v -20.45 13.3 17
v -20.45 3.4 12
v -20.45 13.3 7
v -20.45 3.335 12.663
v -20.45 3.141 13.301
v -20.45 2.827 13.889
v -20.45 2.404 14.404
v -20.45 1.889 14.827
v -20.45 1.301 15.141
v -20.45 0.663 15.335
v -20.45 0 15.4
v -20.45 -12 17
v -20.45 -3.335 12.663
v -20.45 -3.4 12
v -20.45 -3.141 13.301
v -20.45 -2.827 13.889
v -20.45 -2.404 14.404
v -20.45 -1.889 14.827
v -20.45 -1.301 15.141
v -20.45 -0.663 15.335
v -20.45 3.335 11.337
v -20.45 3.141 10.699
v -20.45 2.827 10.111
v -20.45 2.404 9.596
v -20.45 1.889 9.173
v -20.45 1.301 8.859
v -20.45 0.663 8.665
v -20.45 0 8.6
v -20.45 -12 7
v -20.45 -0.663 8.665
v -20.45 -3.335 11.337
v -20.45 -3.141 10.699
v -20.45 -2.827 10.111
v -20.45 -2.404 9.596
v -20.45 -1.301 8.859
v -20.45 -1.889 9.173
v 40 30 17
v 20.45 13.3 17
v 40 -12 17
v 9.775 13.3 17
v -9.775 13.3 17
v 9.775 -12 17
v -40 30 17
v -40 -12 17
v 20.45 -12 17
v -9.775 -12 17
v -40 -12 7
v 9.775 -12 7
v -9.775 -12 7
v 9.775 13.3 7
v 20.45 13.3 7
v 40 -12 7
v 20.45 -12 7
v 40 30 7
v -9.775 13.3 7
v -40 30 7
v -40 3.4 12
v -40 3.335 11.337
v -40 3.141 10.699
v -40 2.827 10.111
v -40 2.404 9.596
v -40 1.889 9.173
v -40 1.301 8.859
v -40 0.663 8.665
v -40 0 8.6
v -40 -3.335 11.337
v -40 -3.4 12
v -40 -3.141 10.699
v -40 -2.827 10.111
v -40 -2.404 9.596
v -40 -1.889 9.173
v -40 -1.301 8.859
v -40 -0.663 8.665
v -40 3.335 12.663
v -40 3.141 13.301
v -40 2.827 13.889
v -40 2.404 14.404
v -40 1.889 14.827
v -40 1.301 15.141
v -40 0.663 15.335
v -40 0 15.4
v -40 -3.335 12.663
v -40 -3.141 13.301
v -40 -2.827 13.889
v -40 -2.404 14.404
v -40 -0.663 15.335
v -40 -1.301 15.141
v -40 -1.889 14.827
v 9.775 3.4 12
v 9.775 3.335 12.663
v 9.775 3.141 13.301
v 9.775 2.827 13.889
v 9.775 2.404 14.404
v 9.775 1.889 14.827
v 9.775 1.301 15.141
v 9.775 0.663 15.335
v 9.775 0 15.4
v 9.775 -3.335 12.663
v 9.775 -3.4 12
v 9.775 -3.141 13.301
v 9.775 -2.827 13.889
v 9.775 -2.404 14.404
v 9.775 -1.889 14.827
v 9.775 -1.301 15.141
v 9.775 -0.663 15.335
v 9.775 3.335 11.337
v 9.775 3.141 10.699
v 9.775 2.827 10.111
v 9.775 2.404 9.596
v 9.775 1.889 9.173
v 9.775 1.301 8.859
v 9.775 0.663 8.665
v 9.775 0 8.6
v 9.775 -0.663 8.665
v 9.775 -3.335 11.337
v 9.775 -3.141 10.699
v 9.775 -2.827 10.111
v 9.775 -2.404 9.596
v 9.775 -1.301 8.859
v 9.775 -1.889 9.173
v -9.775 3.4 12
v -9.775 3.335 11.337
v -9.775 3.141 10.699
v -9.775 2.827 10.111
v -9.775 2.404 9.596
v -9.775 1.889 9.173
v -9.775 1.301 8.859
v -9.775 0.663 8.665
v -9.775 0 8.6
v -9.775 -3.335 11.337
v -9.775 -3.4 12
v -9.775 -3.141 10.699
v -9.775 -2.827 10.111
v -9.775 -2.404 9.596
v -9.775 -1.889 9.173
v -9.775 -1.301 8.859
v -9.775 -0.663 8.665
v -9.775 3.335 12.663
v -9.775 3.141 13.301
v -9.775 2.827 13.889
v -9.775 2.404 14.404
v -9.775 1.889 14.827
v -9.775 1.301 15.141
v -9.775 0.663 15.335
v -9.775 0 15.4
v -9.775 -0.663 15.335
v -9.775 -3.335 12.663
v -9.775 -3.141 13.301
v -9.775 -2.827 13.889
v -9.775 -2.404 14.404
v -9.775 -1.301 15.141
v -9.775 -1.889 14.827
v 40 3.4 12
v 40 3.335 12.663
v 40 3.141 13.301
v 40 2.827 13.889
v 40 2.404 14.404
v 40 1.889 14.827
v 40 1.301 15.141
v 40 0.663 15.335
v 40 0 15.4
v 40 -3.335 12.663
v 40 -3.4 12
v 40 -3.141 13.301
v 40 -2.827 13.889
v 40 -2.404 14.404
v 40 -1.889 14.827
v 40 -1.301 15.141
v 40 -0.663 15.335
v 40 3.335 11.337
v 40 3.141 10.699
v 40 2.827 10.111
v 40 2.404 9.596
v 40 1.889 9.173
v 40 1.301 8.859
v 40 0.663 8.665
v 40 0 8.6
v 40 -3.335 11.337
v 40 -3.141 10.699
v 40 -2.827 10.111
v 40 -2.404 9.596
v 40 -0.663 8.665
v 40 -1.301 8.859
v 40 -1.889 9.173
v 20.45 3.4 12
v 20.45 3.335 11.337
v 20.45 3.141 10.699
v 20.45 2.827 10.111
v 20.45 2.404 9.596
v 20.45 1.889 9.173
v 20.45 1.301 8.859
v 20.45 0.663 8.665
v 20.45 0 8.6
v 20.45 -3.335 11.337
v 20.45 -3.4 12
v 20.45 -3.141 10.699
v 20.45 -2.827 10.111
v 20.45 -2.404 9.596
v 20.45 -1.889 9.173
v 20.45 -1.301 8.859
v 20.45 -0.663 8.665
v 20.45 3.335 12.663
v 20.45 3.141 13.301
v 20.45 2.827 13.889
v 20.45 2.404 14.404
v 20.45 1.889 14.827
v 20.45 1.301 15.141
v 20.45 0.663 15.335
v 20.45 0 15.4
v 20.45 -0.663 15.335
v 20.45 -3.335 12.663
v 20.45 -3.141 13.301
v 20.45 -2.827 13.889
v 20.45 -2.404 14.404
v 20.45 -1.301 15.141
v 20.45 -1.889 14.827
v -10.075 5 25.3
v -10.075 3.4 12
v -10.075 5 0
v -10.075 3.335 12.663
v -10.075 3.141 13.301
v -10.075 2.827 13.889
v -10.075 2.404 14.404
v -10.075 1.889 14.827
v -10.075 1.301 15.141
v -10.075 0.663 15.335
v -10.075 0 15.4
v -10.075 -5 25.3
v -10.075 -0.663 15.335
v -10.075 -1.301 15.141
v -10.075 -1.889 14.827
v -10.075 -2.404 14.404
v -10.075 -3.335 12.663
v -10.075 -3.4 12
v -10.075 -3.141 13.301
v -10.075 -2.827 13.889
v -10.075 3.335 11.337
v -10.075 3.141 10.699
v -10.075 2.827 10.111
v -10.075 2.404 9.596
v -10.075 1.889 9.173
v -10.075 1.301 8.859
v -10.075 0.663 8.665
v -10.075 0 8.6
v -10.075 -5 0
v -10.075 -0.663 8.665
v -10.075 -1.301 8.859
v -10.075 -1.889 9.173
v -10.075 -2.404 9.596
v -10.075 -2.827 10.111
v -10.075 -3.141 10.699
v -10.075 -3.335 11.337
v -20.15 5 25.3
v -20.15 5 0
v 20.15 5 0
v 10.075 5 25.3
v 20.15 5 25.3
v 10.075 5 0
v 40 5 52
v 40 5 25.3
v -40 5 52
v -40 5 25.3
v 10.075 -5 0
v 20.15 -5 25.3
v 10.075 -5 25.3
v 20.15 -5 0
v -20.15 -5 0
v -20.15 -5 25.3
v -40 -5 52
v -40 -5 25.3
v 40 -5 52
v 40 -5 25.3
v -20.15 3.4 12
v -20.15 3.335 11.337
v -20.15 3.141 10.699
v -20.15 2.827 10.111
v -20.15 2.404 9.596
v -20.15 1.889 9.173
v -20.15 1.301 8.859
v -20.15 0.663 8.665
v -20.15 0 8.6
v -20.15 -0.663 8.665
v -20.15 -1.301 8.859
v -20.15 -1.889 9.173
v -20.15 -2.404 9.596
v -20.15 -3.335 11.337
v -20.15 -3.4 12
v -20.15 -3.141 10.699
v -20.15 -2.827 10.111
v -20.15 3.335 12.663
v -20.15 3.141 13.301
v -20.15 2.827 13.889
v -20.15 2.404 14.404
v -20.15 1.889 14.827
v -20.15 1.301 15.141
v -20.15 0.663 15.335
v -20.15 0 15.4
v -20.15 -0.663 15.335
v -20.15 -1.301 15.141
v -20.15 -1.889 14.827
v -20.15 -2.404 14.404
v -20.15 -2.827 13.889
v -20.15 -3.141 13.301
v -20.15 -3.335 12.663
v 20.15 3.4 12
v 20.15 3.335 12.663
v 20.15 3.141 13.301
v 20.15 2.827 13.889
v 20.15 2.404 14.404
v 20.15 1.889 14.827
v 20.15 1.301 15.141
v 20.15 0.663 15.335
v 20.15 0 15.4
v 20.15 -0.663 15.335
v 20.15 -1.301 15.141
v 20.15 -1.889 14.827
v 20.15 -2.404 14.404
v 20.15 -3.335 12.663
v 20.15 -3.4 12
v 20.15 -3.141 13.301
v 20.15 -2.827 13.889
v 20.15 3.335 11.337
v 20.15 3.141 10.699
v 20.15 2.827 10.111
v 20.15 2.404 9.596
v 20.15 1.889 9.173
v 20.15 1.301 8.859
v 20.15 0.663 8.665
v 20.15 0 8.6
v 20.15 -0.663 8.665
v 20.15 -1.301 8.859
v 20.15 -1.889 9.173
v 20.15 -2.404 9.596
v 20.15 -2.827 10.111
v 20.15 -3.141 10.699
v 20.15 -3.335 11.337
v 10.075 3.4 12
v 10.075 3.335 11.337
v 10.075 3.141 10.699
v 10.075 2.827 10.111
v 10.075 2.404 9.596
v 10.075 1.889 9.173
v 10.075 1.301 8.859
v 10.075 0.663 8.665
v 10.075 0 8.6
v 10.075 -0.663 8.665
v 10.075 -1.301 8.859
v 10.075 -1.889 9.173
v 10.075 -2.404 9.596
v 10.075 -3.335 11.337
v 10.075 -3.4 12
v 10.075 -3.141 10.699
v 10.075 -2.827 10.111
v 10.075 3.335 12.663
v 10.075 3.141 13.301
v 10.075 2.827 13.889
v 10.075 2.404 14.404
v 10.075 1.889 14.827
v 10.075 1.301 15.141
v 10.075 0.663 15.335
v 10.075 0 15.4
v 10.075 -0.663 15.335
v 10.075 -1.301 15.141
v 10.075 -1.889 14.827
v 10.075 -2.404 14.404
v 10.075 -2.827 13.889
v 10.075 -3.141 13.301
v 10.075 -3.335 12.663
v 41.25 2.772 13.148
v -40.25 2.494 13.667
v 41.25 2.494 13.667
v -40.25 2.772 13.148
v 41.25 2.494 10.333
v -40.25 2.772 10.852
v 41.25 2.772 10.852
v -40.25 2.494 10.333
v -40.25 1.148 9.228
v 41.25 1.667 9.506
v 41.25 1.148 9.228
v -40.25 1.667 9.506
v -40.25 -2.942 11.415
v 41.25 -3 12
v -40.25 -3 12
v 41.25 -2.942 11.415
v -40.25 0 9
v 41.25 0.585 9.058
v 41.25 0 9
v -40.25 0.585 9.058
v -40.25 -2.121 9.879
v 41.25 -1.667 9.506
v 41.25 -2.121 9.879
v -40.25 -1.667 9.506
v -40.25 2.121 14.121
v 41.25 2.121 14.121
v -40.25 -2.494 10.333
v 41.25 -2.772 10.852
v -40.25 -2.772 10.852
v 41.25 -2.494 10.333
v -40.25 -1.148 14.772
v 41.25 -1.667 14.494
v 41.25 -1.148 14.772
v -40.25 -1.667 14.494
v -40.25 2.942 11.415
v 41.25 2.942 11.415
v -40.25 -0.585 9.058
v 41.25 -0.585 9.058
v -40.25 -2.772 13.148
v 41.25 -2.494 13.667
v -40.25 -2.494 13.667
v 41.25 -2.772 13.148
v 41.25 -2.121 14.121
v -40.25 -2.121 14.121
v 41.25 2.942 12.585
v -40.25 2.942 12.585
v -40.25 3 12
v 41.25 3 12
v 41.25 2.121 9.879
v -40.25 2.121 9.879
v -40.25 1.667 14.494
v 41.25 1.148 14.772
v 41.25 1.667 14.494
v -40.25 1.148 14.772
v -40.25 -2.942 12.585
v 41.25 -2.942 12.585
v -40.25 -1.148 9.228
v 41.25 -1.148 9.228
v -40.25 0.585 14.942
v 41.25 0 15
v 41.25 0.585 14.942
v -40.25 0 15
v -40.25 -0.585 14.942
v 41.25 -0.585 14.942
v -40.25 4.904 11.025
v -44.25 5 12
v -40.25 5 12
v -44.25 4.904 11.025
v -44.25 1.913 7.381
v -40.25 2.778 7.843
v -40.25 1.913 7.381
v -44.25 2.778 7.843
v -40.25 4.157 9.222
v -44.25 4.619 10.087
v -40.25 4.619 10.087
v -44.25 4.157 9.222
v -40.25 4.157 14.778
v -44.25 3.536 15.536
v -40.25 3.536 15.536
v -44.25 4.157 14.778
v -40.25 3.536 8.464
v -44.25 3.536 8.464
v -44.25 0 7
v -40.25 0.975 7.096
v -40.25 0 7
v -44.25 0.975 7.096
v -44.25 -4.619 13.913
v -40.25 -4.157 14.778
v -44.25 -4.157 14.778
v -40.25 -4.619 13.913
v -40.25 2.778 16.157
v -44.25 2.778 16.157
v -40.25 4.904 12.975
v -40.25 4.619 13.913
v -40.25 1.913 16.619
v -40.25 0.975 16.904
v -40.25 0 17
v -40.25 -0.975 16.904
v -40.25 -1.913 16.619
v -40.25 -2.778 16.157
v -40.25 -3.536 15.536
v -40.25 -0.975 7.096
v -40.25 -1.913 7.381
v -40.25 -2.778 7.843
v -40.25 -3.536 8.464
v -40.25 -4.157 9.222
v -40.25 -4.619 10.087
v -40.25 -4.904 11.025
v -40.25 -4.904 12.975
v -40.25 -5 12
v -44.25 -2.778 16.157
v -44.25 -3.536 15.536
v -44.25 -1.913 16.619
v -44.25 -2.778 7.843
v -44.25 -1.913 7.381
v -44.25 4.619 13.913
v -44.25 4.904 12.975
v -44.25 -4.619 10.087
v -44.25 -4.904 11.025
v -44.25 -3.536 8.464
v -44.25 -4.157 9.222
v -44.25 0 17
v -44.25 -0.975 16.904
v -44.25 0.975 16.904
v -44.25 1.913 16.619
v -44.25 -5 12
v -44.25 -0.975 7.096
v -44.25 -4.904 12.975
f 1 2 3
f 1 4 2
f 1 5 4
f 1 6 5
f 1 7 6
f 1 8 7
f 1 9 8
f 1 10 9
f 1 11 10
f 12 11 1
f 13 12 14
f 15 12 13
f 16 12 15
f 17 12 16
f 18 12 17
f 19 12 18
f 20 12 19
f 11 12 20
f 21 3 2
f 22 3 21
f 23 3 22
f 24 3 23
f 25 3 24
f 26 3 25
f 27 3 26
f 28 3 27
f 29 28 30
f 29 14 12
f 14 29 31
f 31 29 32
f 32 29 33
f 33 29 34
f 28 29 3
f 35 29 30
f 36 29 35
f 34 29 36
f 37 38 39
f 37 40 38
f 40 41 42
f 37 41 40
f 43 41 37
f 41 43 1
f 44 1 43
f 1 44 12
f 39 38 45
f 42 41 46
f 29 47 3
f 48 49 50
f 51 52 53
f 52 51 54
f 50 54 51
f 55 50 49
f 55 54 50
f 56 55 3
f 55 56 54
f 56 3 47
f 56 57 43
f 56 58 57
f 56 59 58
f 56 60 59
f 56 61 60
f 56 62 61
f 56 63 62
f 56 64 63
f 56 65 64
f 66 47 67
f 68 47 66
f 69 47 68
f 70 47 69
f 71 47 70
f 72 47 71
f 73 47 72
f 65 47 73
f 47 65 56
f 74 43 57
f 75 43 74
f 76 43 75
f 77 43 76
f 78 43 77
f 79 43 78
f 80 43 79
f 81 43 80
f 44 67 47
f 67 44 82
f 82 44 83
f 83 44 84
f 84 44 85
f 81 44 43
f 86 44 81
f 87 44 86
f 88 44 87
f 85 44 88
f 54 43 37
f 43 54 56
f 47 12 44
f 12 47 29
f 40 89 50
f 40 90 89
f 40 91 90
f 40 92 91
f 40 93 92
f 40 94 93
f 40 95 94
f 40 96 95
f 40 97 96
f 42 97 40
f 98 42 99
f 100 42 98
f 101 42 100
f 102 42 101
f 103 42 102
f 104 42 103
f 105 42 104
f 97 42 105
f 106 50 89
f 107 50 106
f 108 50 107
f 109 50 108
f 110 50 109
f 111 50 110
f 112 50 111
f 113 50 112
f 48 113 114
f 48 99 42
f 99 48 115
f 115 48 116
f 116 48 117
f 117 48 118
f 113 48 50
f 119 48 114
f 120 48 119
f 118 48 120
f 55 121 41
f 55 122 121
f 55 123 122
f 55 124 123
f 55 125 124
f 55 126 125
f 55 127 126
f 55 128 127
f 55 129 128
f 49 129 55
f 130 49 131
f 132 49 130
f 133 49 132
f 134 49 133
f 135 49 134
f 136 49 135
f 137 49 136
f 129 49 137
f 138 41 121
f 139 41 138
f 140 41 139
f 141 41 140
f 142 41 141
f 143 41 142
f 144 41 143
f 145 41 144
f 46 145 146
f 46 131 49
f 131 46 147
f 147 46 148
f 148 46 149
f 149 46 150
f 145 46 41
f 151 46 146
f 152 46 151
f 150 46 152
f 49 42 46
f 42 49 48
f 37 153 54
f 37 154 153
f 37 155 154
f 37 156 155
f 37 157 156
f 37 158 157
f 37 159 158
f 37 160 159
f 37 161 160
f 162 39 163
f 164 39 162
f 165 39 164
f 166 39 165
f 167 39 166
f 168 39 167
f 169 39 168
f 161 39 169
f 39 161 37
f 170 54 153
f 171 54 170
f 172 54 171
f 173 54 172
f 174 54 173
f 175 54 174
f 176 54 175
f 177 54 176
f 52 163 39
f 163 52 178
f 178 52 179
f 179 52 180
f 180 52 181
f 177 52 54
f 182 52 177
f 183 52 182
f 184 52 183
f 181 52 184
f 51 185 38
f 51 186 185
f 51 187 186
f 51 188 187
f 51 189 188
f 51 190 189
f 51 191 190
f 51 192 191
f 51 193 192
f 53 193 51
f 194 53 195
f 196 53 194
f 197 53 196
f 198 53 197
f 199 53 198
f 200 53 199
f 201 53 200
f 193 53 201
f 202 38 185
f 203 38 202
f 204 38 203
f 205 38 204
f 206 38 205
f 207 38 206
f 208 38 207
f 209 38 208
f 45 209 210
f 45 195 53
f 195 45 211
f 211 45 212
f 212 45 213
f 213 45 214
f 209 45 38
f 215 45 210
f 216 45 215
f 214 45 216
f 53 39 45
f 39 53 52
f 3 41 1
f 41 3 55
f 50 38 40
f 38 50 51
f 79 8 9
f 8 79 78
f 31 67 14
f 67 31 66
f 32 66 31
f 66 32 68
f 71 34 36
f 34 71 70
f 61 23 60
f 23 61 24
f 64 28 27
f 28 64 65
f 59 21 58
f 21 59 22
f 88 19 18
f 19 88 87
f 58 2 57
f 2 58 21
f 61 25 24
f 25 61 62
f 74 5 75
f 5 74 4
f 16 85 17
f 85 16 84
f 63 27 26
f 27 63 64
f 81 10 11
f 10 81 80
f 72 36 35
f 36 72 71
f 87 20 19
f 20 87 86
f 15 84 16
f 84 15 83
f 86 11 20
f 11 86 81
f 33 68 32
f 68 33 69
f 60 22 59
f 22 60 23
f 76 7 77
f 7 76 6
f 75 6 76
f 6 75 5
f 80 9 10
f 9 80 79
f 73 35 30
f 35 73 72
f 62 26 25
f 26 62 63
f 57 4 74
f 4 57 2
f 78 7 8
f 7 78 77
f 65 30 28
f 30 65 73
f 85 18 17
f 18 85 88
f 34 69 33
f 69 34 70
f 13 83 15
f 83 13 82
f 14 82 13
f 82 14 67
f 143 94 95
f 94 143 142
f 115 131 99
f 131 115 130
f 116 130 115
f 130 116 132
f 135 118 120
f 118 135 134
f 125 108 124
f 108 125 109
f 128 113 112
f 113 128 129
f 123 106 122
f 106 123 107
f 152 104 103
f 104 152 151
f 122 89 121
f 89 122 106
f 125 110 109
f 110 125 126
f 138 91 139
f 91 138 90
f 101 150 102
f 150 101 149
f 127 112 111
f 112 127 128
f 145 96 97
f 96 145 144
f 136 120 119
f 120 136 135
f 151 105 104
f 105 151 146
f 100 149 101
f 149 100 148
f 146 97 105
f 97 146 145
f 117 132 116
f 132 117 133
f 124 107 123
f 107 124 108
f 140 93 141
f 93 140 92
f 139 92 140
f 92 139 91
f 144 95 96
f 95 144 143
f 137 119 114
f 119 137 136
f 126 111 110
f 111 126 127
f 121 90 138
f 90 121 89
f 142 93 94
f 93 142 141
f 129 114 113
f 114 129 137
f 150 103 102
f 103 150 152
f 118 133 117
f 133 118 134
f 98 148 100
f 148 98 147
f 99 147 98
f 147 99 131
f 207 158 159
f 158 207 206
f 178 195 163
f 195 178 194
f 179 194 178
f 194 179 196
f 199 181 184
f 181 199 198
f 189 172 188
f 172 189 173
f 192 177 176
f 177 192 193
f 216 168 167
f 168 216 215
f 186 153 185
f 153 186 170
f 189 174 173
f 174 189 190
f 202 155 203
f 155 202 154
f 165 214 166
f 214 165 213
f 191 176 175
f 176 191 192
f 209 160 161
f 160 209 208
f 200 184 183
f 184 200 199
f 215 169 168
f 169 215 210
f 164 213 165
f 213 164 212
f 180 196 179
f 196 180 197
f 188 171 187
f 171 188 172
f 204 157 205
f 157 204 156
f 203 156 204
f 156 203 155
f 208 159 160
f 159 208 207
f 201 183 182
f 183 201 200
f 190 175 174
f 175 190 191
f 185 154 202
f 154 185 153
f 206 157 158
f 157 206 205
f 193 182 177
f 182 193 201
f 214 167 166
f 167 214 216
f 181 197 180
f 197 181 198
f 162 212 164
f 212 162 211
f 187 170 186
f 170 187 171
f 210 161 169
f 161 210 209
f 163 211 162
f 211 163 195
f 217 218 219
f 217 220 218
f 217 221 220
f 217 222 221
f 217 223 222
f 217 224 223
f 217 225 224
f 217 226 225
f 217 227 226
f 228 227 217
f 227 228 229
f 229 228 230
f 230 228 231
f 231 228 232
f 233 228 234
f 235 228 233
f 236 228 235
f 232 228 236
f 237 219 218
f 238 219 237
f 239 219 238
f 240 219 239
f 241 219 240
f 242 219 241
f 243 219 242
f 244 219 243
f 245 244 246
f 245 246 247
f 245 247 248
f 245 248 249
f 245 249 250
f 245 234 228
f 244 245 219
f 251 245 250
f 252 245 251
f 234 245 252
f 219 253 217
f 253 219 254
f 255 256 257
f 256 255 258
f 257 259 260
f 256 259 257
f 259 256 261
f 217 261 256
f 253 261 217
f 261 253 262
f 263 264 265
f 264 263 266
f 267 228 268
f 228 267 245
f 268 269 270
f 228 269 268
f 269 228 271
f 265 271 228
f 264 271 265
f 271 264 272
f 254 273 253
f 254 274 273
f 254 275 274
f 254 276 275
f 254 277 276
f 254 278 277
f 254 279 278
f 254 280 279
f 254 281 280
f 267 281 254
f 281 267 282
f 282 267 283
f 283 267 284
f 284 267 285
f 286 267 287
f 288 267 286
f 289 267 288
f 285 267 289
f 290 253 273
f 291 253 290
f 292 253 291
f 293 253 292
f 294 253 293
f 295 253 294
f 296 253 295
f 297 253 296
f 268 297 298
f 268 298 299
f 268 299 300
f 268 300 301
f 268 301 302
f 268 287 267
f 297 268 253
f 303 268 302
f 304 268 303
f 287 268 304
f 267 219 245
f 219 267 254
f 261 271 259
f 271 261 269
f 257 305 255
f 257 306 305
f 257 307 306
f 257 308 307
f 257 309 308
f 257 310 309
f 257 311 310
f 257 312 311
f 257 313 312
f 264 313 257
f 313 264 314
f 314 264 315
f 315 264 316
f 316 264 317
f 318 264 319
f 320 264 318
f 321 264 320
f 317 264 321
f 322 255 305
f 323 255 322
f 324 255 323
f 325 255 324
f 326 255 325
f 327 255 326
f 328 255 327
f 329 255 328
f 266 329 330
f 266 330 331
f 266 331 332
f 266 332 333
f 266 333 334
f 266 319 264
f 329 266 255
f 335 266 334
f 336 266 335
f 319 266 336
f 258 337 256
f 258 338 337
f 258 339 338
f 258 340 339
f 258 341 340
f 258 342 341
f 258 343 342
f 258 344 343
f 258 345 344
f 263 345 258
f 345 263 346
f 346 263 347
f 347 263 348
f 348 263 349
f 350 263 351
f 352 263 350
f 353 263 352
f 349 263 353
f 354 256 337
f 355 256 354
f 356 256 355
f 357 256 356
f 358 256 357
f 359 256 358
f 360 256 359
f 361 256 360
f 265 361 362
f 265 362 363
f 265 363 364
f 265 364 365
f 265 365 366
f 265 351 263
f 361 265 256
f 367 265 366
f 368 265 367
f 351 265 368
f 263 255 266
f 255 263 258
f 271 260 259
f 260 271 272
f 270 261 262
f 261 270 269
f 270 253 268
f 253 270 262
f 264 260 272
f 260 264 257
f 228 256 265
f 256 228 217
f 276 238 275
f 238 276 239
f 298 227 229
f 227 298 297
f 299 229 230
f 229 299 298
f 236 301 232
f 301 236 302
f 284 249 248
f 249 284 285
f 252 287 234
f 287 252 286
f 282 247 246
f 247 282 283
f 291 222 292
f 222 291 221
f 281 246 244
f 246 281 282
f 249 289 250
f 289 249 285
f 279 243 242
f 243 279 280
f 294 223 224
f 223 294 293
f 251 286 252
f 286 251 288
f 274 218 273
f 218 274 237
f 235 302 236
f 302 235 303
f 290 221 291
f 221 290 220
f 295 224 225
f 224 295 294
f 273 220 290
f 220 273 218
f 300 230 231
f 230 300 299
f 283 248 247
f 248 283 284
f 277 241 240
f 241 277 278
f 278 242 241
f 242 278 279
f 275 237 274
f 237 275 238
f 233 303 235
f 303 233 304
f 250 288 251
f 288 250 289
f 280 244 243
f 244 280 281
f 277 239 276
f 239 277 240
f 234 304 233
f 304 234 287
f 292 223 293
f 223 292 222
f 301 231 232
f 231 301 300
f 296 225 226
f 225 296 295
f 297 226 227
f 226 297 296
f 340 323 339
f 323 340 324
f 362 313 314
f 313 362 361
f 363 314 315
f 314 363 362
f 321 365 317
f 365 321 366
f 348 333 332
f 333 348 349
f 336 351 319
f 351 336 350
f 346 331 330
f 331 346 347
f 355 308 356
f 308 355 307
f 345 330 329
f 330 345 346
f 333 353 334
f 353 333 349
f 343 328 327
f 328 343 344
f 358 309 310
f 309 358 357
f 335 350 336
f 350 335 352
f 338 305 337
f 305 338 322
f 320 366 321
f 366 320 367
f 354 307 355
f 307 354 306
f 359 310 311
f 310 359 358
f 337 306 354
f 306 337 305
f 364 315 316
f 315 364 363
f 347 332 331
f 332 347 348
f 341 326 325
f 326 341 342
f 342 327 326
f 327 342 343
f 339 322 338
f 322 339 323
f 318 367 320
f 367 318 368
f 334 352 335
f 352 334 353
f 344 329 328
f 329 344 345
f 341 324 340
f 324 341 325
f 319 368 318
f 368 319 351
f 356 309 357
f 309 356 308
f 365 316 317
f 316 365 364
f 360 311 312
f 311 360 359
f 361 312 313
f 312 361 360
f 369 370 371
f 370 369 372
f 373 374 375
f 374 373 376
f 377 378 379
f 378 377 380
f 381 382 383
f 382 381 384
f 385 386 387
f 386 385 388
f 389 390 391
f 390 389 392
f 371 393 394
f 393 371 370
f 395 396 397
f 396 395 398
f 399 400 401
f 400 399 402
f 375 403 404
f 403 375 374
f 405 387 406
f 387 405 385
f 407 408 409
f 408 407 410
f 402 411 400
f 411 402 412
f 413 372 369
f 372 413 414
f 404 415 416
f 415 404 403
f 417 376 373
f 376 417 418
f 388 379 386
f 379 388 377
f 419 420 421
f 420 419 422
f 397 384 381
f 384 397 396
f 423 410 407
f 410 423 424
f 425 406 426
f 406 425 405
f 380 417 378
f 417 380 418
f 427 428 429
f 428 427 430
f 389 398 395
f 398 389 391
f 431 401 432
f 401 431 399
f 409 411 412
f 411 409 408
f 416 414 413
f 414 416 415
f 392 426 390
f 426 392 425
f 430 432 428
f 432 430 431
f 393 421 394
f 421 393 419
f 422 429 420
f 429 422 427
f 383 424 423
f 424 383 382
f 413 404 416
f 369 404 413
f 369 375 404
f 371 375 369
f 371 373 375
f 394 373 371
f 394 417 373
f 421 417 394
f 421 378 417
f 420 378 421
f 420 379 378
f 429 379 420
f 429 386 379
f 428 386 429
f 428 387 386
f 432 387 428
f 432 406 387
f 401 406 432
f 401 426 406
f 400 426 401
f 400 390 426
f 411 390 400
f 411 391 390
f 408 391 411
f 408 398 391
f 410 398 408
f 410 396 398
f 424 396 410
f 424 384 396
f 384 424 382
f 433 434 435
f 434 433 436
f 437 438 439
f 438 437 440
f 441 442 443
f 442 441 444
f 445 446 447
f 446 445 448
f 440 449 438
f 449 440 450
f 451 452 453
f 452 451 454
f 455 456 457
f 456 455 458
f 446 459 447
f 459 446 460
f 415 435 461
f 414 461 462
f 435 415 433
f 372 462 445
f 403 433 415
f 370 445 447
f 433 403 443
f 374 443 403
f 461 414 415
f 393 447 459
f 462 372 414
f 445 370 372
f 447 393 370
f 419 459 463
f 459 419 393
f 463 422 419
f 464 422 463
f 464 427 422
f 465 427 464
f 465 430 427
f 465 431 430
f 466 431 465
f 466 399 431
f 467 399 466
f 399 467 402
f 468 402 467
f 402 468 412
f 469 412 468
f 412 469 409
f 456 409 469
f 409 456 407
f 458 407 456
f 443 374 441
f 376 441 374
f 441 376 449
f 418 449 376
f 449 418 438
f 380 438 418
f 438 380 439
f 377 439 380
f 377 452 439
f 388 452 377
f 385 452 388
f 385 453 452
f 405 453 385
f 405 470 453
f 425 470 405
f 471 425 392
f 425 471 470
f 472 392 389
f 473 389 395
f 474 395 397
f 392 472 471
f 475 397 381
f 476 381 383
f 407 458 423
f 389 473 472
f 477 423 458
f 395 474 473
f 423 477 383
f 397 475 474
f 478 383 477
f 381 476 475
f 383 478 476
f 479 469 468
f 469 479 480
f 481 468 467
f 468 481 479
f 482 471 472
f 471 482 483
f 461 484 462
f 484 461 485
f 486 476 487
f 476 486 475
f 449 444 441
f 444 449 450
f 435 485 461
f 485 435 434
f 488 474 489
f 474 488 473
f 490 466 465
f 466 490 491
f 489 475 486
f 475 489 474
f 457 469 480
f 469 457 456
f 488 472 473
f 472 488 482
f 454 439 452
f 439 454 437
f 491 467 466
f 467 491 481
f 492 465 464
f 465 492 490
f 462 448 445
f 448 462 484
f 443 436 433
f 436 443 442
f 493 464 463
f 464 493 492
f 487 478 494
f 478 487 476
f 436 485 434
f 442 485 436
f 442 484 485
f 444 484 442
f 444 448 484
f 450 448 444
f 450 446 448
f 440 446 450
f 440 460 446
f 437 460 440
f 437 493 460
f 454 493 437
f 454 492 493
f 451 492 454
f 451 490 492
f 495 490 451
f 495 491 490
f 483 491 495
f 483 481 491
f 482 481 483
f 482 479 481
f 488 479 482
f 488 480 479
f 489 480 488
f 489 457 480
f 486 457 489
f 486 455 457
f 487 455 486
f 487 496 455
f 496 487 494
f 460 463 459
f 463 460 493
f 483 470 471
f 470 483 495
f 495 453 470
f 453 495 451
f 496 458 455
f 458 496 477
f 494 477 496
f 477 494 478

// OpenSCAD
$fn = 32;

// ------------------------------------------------------------------------
// Butt hinge: hinge 80 mm, leaf swung 270 deg
// Every part is its own module, assembly() places every instance.
// ------------------------------------------------------------------------

// --- part 1 ---
module hinge_base() {
  difference() {
    union() {
      translate([-40, -12, -5]) cube([19.55, 42, 10]);
      translate([-9.775, -12, -5]) cube([19.55, 42, 10]);
      translate([20.45, -12, -5]) cube([19.55, 42, 10]);
      translate([-40, 13.3, -5]) cube([80, 16.7, 10]);
    }
    translate([-30.225, 0, 0]) rotate([0, 90, 0]) cylinder(h = 21.55, d = 6.8, center = true);
    translate([0, 0, 0]) rotate([0, 90, 0]) cylinder(h = 21.55, d = 6.8, center = true);
    translate([30.225, 0, 0]) rotate([0, 90, 0]) cylinder(h = 21.55, d = 6.8, center = true);
  }
}

// --- part 2 ---
module hinge_mover() {
  difference() {
    union() {
      translate([-20.15, -40, -5]) cube([10.075, 52, 10]);
      translate([10.075, -40, -5]) cube([10.075, 52, 10]);
      translate([-40, -40, -5]) cube([80, 26.7, 10]);
    }
    translate([-15.113, 0, 0]) rotate([0, 90, 0]) cylinder(h = 12.075, d = 6.8, center = true);
    translate([15.113, 0, 0]) rotate([0, 90, 0]) cylinder(h = 12.075, d = 6.8, center = true);
  }
}

// --- part 3 ---
module hinge_pin() {
  rotate([0, 90, 0]) cylinder(h = 82.5, d = 6, center = true);
  translate([-44.25, 0, 0]) rotate([0, 90, 0]) cylinder(h = 4, d = 10);
}

// --- assembly ---
module assembly() {
  color([0.80, 0.24, 0.20]) translate([0, 0, 12]) rotate([0, 0, 0]) hinge_base();
  color([0.20, 0.45, 0.75]) translate([0, 0, 12]) rotate([270, 0, 0]) hinge_mover();
  color([0.25, 0.62, 0.32]) translate([0, 0, 12]) rotate([0, 0, 0]) hinge_pin();
}

assembly();
